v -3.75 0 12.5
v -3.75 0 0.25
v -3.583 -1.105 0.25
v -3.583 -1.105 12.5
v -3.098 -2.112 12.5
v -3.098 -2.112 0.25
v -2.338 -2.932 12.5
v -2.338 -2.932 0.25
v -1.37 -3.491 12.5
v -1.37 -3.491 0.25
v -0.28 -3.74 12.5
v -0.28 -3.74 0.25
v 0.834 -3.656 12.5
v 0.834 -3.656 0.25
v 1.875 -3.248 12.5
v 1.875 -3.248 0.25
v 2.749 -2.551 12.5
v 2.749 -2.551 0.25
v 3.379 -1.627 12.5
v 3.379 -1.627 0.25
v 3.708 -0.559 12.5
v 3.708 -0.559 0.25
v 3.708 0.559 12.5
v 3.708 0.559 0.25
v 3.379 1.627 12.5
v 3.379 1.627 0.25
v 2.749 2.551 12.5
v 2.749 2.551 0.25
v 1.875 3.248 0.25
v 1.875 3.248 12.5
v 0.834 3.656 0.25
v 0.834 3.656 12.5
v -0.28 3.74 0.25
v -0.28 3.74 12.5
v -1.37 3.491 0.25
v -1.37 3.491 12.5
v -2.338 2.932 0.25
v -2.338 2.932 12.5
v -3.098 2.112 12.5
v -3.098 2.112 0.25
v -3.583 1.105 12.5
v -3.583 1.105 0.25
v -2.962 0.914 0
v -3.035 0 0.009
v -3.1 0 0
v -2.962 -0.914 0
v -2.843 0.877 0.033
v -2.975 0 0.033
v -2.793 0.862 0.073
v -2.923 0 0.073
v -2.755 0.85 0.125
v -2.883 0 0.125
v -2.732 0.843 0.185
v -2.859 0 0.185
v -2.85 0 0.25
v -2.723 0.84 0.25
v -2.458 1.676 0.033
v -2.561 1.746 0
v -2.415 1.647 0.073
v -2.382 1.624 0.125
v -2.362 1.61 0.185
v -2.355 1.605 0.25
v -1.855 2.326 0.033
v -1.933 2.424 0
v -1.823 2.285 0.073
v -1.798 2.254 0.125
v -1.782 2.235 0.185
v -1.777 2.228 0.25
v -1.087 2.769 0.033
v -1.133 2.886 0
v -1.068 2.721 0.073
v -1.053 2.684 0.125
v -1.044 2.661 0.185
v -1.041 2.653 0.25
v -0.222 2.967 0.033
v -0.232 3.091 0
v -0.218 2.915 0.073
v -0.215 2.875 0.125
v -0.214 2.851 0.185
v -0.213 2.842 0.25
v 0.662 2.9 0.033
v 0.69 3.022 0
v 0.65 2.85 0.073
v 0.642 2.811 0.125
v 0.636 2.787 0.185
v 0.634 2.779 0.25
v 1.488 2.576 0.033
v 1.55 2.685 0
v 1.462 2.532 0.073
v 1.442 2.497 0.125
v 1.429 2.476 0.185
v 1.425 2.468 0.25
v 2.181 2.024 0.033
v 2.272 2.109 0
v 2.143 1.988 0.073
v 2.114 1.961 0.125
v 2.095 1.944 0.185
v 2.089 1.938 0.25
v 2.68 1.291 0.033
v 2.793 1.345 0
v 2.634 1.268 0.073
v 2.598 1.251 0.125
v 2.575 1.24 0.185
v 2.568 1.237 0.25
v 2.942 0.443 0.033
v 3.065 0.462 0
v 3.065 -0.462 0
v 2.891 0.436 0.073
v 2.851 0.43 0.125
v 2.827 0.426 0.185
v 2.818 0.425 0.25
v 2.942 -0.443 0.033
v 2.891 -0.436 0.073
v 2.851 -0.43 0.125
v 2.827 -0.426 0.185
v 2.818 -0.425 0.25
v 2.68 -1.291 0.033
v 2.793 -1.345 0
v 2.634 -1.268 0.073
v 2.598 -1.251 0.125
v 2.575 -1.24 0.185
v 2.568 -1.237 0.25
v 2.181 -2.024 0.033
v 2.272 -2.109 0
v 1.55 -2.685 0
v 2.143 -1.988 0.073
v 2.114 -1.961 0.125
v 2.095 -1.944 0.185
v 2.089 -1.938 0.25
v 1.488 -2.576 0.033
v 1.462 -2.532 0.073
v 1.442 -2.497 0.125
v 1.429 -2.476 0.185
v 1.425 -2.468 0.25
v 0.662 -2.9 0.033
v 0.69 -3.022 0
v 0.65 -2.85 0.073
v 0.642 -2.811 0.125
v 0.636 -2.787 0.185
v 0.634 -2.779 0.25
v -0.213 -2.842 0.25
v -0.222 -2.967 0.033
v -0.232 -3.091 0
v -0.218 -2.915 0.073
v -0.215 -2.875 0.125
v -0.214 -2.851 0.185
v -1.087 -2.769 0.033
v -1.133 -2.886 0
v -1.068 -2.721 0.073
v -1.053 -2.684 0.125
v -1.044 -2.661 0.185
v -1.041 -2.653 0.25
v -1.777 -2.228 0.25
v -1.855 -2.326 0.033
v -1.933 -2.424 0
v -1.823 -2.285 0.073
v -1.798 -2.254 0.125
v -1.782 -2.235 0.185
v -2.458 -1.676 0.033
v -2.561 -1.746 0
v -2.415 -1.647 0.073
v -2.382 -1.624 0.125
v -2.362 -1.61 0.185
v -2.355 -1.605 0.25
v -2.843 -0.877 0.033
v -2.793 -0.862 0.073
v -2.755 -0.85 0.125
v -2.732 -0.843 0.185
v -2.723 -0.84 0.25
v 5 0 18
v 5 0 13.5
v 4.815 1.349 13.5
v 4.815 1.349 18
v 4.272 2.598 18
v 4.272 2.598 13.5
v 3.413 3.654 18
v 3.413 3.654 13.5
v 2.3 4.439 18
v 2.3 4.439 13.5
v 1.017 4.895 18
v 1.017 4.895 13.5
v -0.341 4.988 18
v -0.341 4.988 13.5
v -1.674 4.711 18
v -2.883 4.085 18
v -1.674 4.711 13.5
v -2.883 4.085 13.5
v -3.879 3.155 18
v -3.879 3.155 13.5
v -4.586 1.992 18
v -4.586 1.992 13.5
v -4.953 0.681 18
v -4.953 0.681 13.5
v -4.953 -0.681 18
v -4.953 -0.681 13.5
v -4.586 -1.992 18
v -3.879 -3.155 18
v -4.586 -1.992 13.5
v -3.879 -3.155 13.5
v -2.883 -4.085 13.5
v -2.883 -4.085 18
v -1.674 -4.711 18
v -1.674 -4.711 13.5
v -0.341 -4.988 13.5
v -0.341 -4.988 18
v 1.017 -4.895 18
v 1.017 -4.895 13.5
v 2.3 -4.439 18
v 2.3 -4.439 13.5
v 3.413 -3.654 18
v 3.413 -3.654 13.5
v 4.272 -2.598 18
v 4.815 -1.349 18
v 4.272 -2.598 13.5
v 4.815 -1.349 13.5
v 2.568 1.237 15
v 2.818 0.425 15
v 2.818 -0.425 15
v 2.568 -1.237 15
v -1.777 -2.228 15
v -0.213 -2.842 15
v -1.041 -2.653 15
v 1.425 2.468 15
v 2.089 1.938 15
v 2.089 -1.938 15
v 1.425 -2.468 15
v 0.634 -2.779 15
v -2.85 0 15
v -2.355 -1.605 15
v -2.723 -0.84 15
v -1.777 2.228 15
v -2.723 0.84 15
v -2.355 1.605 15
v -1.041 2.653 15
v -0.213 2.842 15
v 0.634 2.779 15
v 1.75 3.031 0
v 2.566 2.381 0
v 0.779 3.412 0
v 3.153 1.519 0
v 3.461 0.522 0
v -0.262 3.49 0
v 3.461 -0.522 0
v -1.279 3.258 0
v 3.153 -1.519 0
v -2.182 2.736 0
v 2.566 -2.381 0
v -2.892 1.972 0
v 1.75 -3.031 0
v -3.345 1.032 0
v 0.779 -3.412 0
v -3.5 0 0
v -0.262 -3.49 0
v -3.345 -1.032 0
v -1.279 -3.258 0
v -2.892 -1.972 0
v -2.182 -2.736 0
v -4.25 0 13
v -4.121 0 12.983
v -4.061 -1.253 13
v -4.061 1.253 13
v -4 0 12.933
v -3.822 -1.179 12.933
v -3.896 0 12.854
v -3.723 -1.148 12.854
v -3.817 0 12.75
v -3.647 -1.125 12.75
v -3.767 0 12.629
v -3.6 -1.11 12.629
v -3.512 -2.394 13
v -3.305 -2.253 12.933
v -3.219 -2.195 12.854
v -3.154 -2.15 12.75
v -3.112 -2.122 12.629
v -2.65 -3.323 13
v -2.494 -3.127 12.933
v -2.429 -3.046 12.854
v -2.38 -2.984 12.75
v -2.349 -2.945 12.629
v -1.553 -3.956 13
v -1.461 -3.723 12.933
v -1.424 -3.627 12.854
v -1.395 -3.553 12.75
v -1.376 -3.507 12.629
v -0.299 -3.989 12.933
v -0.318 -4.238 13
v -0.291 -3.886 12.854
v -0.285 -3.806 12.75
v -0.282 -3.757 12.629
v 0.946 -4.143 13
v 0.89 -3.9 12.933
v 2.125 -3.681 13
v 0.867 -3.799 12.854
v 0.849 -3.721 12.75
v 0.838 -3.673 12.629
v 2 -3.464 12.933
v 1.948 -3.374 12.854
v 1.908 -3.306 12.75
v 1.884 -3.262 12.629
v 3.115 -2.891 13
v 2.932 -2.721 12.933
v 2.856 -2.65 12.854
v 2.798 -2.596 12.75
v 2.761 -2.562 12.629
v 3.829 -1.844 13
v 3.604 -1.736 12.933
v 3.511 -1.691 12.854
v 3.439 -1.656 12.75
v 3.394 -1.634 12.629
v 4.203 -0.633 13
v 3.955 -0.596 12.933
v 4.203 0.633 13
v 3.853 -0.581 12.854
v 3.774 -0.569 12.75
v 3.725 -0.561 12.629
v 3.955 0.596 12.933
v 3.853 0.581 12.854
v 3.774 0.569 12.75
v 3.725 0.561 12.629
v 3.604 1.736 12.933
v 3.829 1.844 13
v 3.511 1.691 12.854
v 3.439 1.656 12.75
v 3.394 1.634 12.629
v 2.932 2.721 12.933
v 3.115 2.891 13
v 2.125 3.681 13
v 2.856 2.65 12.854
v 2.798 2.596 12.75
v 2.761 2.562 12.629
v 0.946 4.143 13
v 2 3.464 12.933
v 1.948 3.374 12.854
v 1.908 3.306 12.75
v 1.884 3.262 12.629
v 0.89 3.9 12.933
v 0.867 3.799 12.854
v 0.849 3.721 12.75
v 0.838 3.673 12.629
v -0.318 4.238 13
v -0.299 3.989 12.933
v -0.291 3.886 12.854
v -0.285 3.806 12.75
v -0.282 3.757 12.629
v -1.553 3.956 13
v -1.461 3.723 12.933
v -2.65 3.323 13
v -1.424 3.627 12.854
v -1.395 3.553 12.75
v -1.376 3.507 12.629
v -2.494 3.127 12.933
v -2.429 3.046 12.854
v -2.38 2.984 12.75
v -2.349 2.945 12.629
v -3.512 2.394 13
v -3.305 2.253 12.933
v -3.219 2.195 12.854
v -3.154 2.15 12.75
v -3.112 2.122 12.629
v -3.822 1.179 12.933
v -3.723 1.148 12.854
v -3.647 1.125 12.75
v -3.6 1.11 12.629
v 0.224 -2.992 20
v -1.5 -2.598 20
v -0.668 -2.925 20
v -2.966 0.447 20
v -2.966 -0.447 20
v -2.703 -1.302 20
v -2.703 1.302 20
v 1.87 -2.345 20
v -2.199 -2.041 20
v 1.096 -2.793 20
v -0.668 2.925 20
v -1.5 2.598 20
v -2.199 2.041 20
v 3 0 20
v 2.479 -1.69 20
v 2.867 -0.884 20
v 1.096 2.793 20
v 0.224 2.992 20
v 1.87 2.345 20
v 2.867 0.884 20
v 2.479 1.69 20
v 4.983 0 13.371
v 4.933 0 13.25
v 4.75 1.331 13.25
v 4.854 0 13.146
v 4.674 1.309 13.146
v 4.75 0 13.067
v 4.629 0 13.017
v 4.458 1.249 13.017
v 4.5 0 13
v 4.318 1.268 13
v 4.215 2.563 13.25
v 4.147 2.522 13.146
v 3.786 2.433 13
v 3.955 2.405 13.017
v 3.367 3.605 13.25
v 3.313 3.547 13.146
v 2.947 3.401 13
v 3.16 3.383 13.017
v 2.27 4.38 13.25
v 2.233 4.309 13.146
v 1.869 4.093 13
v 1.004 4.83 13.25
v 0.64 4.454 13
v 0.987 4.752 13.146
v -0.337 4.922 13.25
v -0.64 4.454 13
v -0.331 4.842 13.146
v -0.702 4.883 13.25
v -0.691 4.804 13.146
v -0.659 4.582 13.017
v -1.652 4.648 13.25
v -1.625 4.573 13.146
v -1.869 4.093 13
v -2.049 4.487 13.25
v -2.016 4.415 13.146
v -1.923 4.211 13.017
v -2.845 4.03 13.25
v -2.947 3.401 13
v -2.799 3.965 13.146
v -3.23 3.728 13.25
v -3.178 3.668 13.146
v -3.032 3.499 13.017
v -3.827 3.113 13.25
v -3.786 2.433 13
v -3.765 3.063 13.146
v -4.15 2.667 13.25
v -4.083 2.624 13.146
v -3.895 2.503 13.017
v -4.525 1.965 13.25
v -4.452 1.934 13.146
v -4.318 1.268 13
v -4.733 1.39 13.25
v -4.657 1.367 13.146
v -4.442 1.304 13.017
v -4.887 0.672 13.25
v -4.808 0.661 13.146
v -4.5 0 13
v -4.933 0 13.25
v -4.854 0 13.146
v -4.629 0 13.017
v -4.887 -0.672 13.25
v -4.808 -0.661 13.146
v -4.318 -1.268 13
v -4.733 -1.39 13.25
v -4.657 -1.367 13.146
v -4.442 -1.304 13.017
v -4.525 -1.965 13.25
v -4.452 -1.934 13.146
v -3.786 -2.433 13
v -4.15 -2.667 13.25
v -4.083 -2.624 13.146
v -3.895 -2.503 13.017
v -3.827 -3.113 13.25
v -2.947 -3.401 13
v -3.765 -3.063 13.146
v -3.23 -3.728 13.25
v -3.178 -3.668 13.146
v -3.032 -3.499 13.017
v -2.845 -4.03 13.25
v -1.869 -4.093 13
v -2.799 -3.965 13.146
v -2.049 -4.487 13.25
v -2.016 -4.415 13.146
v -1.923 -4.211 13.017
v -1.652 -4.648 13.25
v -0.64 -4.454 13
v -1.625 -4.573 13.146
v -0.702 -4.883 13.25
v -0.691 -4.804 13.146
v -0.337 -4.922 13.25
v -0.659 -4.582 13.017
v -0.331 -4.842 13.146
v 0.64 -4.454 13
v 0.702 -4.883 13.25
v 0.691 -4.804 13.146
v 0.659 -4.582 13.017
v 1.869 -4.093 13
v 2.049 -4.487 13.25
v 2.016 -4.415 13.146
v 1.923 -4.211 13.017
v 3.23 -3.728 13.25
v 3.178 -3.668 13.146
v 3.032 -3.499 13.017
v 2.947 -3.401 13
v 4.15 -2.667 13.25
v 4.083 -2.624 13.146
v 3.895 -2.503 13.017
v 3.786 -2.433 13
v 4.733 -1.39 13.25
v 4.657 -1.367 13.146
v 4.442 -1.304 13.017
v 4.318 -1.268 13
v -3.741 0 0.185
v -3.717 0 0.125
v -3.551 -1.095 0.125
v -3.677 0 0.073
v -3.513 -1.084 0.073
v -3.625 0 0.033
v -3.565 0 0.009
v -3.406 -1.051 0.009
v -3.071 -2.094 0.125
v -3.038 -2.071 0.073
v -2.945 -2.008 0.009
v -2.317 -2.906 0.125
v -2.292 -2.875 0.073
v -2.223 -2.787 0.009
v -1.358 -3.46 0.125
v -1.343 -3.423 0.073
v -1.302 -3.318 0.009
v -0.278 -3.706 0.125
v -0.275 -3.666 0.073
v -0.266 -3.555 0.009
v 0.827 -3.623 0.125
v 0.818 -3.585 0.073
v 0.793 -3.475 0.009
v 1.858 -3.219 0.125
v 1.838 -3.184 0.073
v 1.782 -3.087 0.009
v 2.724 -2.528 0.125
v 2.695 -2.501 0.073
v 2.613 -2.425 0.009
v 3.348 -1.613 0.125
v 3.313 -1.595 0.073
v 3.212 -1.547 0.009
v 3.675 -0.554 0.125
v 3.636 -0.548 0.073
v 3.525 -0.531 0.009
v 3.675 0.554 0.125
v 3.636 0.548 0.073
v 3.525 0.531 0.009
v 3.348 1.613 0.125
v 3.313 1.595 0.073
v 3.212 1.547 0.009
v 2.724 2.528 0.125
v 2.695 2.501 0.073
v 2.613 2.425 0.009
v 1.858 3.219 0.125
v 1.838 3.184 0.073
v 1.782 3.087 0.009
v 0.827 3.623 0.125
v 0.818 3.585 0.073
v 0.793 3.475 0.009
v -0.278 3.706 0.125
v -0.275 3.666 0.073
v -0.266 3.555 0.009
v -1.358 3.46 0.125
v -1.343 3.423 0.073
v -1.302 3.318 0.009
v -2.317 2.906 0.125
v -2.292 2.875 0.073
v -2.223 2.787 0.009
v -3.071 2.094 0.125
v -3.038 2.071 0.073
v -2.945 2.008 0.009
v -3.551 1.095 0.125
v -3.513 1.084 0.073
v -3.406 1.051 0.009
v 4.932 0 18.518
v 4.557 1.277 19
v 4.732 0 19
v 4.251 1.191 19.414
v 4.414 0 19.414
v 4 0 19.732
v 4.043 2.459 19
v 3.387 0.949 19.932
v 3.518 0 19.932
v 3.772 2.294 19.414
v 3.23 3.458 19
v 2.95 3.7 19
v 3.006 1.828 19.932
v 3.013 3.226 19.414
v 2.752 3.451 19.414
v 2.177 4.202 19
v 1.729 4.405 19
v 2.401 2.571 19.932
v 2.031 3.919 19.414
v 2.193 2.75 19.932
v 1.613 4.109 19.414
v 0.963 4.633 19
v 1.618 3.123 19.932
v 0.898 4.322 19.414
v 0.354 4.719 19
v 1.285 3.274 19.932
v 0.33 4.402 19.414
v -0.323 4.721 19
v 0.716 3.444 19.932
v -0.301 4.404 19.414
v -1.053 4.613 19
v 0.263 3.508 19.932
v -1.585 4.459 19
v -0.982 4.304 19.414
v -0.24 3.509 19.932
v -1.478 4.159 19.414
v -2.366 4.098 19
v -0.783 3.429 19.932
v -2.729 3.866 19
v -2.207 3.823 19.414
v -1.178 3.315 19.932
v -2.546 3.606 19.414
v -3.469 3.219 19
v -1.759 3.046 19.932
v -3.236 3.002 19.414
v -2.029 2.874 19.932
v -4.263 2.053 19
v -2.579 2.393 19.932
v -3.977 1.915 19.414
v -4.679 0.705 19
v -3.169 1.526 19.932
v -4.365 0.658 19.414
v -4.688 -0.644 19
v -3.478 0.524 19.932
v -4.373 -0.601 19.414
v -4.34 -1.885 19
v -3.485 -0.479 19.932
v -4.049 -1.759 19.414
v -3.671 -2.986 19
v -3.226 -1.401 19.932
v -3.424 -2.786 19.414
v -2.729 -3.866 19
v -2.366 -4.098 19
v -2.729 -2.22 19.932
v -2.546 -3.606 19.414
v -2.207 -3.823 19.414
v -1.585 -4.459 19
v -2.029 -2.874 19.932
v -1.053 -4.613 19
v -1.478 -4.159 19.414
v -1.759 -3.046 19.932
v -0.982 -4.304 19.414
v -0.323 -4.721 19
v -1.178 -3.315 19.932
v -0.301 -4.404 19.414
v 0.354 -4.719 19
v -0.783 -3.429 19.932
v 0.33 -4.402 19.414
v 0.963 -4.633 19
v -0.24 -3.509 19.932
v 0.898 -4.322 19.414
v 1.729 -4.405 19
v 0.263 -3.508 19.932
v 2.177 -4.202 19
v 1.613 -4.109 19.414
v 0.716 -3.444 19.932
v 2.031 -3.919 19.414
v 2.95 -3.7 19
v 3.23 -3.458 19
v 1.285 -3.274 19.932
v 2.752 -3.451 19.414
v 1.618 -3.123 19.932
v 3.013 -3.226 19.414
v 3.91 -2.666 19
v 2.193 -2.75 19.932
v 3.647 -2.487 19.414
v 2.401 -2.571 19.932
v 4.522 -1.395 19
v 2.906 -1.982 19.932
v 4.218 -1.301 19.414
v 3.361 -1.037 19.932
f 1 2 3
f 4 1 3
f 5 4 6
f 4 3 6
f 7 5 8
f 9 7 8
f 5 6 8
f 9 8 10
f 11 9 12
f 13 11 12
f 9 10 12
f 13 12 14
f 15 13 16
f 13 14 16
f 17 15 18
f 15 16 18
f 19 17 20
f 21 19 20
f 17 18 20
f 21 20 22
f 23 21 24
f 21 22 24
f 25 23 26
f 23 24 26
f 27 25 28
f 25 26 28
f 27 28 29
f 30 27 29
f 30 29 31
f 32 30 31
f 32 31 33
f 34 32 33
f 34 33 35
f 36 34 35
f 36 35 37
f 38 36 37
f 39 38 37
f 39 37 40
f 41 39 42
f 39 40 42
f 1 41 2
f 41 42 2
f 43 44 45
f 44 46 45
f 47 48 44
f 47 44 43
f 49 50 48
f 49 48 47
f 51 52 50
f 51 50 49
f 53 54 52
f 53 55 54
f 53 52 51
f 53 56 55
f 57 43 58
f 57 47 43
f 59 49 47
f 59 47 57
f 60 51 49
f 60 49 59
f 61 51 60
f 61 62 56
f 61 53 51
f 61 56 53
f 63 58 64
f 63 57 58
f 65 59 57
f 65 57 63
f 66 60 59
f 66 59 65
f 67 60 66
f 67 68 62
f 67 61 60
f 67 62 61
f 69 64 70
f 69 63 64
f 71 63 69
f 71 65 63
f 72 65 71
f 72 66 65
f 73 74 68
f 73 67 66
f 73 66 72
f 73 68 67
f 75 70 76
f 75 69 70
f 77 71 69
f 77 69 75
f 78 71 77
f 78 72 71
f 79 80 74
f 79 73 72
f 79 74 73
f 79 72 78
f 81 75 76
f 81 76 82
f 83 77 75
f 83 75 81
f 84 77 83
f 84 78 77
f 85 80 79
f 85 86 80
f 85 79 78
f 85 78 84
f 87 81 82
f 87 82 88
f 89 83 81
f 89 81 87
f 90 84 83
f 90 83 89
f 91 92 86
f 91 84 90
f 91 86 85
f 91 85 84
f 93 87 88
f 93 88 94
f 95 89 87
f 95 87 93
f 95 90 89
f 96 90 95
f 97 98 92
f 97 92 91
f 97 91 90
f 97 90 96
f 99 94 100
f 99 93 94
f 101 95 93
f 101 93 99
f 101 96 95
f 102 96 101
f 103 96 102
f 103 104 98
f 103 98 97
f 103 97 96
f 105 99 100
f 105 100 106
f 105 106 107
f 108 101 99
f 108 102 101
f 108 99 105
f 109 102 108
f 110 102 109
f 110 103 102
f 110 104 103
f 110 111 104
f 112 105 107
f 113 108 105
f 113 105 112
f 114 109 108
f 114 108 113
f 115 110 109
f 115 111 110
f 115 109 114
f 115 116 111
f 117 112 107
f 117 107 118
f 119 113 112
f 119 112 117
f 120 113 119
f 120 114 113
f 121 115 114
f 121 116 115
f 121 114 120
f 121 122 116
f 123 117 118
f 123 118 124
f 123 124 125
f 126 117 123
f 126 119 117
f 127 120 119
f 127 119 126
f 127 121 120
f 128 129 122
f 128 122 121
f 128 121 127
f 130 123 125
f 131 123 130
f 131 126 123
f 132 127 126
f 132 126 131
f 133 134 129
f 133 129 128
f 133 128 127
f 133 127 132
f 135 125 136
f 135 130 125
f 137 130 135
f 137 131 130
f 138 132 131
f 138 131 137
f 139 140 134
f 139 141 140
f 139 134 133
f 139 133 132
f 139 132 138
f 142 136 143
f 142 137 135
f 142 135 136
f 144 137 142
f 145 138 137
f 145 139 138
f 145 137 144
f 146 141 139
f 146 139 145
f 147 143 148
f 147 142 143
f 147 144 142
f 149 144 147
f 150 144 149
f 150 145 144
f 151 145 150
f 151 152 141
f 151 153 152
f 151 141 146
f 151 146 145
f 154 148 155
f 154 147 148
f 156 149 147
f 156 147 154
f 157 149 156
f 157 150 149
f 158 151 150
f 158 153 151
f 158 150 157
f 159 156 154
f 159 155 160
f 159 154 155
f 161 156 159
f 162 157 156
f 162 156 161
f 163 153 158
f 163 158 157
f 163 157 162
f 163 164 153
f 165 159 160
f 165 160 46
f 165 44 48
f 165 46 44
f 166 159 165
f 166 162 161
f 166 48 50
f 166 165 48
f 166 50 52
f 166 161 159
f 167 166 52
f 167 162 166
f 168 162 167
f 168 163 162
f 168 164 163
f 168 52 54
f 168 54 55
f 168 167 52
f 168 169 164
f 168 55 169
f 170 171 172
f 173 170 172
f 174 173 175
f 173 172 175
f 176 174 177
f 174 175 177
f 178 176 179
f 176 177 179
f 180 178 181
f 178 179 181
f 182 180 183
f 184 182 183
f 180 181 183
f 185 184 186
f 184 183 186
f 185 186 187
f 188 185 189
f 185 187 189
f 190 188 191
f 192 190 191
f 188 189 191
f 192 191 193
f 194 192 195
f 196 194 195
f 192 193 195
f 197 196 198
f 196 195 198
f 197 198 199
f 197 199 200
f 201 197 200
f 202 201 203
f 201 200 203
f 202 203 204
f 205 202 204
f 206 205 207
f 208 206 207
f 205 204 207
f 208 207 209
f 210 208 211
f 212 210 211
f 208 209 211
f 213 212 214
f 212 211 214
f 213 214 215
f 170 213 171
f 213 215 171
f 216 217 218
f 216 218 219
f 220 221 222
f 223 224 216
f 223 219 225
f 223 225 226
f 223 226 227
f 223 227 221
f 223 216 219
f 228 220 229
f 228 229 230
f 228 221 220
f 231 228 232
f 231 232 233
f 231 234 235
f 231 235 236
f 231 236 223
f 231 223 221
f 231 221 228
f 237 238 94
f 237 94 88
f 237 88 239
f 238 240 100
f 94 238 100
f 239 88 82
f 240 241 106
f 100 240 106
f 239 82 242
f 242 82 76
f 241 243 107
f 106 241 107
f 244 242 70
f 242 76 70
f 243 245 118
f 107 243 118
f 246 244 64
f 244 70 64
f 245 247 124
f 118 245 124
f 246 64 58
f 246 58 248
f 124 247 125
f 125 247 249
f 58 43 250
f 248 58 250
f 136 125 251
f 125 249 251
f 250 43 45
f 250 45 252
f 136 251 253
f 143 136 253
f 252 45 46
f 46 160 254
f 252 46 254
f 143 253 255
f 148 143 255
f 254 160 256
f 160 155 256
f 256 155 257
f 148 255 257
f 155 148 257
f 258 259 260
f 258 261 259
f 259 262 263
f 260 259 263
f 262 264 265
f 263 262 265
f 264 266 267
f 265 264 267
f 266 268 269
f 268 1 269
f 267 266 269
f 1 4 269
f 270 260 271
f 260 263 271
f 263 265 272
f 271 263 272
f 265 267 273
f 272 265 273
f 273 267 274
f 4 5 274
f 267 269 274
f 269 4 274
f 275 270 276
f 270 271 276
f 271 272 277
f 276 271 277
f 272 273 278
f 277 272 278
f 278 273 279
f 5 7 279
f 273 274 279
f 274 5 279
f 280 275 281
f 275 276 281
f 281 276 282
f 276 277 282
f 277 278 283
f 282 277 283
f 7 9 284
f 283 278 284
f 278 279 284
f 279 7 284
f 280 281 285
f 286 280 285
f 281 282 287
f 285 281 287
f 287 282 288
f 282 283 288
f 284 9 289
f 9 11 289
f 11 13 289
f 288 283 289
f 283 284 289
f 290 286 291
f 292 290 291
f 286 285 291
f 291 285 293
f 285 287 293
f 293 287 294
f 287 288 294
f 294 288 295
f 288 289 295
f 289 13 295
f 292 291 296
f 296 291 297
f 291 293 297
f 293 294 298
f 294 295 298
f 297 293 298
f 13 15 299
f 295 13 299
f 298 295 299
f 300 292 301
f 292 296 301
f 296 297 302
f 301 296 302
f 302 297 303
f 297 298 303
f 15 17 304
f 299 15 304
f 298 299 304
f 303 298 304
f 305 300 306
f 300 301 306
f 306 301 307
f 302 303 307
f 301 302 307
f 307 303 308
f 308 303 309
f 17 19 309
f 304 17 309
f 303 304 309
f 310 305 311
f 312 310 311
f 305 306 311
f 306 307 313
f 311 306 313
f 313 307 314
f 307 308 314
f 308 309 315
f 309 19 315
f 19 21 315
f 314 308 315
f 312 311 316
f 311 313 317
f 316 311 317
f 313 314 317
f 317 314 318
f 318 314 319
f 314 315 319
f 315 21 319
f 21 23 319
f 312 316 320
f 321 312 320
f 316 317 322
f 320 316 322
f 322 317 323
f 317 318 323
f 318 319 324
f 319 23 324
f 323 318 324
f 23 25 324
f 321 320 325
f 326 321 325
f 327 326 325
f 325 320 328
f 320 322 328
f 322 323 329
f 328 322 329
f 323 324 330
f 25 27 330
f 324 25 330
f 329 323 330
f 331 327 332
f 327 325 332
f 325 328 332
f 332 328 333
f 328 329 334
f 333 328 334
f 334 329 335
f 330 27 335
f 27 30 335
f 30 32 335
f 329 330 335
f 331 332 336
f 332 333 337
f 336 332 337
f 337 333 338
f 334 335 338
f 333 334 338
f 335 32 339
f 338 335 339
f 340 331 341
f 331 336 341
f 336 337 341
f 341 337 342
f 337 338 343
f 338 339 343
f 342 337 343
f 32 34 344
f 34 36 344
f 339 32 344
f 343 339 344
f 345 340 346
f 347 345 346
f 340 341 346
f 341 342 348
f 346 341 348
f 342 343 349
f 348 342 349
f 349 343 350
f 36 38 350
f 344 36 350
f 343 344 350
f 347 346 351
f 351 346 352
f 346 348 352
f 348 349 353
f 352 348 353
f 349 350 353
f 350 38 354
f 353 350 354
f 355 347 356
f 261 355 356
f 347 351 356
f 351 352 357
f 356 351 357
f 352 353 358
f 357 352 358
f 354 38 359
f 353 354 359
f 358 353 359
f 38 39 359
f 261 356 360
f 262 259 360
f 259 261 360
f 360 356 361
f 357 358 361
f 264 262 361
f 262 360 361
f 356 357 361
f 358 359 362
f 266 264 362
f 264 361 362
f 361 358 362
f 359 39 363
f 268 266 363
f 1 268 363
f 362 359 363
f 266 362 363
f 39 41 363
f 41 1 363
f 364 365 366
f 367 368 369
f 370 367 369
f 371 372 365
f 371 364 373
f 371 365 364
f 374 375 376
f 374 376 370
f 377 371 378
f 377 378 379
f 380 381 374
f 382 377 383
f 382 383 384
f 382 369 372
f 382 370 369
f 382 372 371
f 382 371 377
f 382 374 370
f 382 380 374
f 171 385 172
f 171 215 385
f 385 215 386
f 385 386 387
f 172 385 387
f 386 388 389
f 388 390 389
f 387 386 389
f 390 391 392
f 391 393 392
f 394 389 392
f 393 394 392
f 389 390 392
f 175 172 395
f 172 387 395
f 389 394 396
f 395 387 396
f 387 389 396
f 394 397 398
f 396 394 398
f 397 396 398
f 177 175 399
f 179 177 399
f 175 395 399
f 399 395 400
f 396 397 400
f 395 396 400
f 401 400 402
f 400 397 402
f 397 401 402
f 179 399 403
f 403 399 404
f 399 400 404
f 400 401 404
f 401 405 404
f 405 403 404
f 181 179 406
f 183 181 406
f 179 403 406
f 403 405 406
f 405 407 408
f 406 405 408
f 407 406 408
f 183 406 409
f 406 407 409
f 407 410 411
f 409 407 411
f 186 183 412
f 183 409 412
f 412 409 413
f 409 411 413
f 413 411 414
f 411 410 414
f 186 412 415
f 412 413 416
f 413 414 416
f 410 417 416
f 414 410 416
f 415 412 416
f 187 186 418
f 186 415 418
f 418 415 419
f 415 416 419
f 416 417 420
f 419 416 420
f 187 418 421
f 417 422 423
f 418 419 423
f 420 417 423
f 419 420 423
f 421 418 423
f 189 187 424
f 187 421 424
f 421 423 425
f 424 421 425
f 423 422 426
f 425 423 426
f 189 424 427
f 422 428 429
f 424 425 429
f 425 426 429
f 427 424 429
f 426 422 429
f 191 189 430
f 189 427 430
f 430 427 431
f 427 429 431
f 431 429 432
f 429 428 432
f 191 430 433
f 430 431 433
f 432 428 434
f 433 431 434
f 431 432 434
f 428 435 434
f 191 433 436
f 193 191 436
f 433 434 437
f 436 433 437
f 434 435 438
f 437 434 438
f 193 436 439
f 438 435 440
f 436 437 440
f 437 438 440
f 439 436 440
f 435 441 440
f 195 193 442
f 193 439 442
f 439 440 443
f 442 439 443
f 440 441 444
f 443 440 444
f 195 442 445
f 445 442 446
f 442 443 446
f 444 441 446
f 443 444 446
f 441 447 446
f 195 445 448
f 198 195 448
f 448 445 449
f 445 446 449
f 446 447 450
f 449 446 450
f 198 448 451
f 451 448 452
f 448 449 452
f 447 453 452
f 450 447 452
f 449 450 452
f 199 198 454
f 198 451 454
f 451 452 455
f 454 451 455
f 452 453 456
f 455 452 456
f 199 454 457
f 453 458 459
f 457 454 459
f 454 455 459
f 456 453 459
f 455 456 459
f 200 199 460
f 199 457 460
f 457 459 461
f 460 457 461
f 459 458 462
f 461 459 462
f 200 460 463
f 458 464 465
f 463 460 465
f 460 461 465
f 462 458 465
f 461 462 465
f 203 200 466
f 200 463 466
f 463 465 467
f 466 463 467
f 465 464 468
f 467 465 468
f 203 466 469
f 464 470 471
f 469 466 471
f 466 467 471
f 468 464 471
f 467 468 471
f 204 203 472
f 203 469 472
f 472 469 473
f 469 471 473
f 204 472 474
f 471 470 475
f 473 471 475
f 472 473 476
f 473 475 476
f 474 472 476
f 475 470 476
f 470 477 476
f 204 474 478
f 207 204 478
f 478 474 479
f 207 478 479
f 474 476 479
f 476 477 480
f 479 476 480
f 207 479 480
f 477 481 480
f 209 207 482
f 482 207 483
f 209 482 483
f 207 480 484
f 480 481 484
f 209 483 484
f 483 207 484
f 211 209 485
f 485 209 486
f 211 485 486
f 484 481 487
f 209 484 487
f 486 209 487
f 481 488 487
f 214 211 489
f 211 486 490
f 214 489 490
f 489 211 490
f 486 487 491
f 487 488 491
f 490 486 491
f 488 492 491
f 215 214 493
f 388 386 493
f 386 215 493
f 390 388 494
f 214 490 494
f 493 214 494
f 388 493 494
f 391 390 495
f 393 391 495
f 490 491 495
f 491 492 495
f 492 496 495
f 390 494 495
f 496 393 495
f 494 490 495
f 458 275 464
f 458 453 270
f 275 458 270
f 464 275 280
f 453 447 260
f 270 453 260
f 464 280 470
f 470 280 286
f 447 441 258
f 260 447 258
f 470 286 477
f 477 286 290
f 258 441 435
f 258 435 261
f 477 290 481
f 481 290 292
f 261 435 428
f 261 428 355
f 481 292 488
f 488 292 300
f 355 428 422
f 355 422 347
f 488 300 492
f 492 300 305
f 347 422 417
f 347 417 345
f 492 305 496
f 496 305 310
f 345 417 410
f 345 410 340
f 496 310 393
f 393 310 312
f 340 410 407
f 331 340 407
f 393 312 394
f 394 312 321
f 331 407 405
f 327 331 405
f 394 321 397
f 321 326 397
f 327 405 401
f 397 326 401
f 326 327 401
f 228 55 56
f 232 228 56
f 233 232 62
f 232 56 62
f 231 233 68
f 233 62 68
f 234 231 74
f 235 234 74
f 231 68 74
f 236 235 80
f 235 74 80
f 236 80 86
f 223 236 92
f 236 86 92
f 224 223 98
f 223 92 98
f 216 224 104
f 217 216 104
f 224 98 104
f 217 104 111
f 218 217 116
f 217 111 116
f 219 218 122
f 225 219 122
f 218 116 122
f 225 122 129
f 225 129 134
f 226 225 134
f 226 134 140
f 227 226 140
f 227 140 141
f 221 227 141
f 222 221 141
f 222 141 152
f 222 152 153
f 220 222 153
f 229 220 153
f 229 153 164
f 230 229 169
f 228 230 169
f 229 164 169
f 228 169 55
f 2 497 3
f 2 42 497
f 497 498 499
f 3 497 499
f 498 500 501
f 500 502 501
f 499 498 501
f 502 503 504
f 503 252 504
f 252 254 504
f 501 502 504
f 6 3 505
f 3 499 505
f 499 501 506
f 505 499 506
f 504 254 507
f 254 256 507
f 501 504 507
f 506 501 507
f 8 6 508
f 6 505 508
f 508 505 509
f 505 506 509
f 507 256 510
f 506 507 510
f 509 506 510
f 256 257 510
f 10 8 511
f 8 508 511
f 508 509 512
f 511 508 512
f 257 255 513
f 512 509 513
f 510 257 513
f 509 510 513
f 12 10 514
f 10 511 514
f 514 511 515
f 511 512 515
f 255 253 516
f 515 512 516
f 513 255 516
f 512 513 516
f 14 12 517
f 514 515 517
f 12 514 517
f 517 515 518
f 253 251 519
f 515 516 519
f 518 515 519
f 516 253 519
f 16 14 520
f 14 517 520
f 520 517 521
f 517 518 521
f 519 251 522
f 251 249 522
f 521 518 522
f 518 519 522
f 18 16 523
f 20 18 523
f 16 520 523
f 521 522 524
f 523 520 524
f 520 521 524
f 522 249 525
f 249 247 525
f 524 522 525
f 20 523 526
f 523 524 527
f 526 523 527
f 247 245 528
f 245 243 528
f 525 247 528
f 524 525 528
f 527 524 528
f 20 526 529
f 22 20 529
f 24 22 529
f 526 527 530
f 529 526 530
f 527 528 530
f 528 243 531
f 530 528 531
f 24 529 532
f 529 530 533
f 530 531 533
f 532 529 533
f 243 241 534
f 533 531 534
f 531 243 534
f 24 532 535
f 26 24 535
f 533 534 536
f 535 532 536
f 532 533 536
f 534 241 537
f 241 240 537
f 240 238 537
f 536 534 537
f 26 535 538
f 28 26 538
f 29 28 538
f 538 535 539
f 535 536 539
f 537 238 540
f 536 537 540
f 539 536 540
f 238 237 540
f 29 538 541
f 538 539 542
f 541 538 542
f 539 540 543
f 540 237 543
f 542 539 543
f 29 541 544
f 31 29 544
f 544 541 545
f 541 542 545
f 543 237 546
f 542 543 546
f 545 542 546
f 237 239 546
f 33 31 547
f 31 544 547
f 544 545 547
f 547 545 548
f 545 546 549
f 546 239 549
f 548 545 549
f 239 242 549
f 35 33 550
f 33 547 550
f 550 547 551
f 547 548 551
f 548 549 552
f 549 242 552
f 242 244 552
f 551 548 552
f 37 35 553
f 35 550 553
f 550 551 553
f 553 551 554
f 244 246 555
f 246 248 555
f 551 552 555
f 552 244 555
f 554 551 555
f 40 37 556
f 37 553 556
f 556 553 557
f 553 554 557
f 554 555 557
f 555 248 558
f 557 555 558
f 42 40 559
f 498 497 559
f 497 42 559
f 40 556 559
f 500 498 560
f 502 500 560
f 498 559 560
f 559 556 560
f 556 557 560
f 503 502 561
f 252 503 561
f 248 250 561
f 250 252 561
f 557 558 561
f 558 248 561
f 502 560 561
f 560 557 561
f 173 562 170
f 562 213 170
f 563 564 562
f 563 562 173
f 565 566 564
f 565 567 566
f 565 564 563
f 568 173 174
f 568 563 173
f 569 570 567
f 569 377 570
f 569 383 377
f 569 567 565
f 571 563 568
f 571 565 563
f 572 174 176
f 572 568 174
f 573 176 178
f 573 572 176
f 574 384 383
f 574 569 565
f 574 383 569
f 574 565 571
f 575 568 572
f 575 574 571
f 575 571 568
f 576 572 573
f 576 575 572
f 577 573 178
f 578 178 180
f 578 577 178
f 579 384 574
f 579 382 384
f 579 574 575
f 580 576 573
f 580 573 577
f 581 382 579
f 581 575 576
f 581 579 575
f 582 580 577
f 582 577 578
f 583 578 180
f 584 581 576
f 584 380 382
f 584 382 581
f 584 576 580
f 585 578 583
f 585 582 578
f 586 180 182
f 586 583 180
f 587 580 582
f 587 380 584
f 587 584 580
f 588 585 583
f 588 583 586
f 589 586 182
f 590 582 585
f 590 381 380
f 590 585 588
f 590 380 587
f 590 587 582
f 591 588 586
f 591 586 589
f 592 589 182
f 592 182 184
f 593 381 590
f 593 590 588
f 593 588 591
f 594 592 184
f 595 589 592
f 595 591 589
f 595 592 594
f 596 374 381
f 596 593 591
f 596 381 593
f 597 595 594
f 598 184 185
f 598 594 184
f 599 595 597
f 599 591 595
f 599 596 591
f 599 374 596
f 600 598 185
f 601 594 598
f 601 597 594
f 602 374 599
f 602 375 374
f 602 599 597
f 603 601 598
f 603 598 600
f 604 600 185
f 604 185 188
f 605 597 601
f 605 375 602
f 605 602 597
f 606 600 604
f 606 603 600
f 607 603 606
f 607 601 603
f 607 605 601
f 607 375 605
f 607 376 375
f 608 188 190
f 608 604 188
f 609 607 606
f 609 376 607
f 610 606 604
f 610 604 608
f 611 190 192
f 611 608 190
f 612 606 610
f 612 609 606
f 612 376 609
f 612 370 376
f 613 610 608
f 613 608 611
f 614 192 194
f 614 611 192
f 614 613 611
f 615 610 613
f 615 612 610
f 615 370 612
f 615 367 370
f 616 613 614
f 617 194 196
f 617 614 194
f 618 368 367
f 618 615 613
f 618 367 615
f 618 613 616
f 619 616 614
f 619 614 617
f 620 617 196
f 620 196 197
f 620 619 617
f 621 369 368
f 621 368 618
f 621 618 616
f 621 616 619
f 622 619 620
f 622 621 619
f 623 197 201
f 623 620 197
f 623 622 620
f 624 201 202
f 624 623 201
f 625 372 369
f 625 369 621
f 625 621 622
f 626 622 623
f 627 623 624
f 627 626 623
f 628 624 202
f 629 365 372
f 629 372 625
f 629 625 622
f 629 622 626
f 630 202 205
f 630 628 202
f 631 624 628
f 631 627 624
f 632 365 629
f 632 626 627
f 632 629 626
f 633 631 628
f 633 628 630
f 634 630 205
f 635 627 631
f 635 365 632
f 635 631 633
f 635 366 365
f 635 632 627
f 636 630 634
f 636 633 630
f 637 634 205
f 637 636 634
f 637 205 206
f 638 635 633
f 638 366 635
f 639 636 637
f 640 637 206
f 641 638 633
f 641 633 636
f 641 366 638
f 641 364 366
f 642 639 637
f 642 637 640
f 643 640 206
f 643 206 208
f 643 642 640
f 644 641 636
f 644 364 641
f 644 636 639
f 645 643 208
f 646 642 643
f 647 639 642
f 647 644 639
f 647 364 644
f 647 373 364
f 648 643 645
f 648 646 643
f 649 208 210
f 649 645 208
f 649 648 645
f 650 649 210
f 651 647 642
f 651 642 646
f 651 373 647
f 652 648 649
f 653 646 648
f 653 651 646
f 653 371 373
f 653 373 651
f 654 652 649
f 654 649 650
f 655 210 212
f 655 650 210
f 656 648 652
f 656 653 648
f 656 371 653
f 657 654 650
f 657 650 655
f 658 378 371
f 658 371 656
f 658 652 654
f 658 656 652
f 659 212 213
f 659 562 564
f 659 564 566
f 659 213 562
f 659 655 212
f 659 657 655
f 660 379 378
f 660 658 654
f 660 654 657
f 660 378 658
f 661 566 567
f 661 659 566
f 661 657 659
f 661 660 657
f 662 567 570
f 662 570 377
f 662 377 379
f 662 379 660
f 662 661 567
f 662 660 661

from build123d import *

# Parameters (mm, degrees)
SKETCH1_R           = 3.75
BOSS_EXTRUDE1_DEPTH = 13
SKETCH2_R           = 5
BOSS_EXTRUDE2_DEPTH = 7
SKETCH3_R           = 2.85
CUT_EXTRUDE1_DEPTH  = 15
FILLET1_R           = 0.5
FILLET2_R           = 0.25
FILLET3_R           = 2


with BuildPart() as part:
    # Sketch1 → Boss-Extrude1 (new body)
    with BuildSketch(Plane.XY):
        with Locations(Location((0, 0, 0), (0, 0, 180))):
            Circle(SKETCH1_R)
    extrude(amount=BOSS_EXTRUDE1_DEPTH)

    # Sketch2 → Boss-Extrude2 (add)
    with BuildSketch(Plane.XY.offset(13)):
        Circle(SKETCH2_R)
    extrude(amount=BOSS_EXTRUDE2_DEPTH)

    # Sketch3 → Cut-Extrude1 (cut)
    with BuildSketch(Plane(origin=(0, 0, 0), x_dir=(-1, 0, 0), z_dir=(0, 0, -1))):
        Circle(SKETCH3_R)
    extrude(amount=-CUT_EXTRUDE1_DEPTH, mode=Mode.SUBTRACT)

    # Fillet1
    fillet1_edges = [part.edges().sort_by_distance(p)[0] for p in [
        (3.75, 0, 13),
        (-5, 0, 13),
    ]]
    fillet(fillet1_edges, radius=FILLET1_R)

    # Fillet2
    fillet2_edges = [part.edges().sort_by_distance(p)[0] for p in [
        (2.85, 0, 0),
        (3.75, 0, 0),
    ]]
    fillet(fillet2_edges, radius=FILLET2_R)

    # Fillet3
    fillet3_edges = [part.edges().sort_by_distance(p)[0] for p in [
        (-5, 0, 20),
    ]]
    fillet(fillet3_edges, radius=FILLET3_R)


solid = part.part
